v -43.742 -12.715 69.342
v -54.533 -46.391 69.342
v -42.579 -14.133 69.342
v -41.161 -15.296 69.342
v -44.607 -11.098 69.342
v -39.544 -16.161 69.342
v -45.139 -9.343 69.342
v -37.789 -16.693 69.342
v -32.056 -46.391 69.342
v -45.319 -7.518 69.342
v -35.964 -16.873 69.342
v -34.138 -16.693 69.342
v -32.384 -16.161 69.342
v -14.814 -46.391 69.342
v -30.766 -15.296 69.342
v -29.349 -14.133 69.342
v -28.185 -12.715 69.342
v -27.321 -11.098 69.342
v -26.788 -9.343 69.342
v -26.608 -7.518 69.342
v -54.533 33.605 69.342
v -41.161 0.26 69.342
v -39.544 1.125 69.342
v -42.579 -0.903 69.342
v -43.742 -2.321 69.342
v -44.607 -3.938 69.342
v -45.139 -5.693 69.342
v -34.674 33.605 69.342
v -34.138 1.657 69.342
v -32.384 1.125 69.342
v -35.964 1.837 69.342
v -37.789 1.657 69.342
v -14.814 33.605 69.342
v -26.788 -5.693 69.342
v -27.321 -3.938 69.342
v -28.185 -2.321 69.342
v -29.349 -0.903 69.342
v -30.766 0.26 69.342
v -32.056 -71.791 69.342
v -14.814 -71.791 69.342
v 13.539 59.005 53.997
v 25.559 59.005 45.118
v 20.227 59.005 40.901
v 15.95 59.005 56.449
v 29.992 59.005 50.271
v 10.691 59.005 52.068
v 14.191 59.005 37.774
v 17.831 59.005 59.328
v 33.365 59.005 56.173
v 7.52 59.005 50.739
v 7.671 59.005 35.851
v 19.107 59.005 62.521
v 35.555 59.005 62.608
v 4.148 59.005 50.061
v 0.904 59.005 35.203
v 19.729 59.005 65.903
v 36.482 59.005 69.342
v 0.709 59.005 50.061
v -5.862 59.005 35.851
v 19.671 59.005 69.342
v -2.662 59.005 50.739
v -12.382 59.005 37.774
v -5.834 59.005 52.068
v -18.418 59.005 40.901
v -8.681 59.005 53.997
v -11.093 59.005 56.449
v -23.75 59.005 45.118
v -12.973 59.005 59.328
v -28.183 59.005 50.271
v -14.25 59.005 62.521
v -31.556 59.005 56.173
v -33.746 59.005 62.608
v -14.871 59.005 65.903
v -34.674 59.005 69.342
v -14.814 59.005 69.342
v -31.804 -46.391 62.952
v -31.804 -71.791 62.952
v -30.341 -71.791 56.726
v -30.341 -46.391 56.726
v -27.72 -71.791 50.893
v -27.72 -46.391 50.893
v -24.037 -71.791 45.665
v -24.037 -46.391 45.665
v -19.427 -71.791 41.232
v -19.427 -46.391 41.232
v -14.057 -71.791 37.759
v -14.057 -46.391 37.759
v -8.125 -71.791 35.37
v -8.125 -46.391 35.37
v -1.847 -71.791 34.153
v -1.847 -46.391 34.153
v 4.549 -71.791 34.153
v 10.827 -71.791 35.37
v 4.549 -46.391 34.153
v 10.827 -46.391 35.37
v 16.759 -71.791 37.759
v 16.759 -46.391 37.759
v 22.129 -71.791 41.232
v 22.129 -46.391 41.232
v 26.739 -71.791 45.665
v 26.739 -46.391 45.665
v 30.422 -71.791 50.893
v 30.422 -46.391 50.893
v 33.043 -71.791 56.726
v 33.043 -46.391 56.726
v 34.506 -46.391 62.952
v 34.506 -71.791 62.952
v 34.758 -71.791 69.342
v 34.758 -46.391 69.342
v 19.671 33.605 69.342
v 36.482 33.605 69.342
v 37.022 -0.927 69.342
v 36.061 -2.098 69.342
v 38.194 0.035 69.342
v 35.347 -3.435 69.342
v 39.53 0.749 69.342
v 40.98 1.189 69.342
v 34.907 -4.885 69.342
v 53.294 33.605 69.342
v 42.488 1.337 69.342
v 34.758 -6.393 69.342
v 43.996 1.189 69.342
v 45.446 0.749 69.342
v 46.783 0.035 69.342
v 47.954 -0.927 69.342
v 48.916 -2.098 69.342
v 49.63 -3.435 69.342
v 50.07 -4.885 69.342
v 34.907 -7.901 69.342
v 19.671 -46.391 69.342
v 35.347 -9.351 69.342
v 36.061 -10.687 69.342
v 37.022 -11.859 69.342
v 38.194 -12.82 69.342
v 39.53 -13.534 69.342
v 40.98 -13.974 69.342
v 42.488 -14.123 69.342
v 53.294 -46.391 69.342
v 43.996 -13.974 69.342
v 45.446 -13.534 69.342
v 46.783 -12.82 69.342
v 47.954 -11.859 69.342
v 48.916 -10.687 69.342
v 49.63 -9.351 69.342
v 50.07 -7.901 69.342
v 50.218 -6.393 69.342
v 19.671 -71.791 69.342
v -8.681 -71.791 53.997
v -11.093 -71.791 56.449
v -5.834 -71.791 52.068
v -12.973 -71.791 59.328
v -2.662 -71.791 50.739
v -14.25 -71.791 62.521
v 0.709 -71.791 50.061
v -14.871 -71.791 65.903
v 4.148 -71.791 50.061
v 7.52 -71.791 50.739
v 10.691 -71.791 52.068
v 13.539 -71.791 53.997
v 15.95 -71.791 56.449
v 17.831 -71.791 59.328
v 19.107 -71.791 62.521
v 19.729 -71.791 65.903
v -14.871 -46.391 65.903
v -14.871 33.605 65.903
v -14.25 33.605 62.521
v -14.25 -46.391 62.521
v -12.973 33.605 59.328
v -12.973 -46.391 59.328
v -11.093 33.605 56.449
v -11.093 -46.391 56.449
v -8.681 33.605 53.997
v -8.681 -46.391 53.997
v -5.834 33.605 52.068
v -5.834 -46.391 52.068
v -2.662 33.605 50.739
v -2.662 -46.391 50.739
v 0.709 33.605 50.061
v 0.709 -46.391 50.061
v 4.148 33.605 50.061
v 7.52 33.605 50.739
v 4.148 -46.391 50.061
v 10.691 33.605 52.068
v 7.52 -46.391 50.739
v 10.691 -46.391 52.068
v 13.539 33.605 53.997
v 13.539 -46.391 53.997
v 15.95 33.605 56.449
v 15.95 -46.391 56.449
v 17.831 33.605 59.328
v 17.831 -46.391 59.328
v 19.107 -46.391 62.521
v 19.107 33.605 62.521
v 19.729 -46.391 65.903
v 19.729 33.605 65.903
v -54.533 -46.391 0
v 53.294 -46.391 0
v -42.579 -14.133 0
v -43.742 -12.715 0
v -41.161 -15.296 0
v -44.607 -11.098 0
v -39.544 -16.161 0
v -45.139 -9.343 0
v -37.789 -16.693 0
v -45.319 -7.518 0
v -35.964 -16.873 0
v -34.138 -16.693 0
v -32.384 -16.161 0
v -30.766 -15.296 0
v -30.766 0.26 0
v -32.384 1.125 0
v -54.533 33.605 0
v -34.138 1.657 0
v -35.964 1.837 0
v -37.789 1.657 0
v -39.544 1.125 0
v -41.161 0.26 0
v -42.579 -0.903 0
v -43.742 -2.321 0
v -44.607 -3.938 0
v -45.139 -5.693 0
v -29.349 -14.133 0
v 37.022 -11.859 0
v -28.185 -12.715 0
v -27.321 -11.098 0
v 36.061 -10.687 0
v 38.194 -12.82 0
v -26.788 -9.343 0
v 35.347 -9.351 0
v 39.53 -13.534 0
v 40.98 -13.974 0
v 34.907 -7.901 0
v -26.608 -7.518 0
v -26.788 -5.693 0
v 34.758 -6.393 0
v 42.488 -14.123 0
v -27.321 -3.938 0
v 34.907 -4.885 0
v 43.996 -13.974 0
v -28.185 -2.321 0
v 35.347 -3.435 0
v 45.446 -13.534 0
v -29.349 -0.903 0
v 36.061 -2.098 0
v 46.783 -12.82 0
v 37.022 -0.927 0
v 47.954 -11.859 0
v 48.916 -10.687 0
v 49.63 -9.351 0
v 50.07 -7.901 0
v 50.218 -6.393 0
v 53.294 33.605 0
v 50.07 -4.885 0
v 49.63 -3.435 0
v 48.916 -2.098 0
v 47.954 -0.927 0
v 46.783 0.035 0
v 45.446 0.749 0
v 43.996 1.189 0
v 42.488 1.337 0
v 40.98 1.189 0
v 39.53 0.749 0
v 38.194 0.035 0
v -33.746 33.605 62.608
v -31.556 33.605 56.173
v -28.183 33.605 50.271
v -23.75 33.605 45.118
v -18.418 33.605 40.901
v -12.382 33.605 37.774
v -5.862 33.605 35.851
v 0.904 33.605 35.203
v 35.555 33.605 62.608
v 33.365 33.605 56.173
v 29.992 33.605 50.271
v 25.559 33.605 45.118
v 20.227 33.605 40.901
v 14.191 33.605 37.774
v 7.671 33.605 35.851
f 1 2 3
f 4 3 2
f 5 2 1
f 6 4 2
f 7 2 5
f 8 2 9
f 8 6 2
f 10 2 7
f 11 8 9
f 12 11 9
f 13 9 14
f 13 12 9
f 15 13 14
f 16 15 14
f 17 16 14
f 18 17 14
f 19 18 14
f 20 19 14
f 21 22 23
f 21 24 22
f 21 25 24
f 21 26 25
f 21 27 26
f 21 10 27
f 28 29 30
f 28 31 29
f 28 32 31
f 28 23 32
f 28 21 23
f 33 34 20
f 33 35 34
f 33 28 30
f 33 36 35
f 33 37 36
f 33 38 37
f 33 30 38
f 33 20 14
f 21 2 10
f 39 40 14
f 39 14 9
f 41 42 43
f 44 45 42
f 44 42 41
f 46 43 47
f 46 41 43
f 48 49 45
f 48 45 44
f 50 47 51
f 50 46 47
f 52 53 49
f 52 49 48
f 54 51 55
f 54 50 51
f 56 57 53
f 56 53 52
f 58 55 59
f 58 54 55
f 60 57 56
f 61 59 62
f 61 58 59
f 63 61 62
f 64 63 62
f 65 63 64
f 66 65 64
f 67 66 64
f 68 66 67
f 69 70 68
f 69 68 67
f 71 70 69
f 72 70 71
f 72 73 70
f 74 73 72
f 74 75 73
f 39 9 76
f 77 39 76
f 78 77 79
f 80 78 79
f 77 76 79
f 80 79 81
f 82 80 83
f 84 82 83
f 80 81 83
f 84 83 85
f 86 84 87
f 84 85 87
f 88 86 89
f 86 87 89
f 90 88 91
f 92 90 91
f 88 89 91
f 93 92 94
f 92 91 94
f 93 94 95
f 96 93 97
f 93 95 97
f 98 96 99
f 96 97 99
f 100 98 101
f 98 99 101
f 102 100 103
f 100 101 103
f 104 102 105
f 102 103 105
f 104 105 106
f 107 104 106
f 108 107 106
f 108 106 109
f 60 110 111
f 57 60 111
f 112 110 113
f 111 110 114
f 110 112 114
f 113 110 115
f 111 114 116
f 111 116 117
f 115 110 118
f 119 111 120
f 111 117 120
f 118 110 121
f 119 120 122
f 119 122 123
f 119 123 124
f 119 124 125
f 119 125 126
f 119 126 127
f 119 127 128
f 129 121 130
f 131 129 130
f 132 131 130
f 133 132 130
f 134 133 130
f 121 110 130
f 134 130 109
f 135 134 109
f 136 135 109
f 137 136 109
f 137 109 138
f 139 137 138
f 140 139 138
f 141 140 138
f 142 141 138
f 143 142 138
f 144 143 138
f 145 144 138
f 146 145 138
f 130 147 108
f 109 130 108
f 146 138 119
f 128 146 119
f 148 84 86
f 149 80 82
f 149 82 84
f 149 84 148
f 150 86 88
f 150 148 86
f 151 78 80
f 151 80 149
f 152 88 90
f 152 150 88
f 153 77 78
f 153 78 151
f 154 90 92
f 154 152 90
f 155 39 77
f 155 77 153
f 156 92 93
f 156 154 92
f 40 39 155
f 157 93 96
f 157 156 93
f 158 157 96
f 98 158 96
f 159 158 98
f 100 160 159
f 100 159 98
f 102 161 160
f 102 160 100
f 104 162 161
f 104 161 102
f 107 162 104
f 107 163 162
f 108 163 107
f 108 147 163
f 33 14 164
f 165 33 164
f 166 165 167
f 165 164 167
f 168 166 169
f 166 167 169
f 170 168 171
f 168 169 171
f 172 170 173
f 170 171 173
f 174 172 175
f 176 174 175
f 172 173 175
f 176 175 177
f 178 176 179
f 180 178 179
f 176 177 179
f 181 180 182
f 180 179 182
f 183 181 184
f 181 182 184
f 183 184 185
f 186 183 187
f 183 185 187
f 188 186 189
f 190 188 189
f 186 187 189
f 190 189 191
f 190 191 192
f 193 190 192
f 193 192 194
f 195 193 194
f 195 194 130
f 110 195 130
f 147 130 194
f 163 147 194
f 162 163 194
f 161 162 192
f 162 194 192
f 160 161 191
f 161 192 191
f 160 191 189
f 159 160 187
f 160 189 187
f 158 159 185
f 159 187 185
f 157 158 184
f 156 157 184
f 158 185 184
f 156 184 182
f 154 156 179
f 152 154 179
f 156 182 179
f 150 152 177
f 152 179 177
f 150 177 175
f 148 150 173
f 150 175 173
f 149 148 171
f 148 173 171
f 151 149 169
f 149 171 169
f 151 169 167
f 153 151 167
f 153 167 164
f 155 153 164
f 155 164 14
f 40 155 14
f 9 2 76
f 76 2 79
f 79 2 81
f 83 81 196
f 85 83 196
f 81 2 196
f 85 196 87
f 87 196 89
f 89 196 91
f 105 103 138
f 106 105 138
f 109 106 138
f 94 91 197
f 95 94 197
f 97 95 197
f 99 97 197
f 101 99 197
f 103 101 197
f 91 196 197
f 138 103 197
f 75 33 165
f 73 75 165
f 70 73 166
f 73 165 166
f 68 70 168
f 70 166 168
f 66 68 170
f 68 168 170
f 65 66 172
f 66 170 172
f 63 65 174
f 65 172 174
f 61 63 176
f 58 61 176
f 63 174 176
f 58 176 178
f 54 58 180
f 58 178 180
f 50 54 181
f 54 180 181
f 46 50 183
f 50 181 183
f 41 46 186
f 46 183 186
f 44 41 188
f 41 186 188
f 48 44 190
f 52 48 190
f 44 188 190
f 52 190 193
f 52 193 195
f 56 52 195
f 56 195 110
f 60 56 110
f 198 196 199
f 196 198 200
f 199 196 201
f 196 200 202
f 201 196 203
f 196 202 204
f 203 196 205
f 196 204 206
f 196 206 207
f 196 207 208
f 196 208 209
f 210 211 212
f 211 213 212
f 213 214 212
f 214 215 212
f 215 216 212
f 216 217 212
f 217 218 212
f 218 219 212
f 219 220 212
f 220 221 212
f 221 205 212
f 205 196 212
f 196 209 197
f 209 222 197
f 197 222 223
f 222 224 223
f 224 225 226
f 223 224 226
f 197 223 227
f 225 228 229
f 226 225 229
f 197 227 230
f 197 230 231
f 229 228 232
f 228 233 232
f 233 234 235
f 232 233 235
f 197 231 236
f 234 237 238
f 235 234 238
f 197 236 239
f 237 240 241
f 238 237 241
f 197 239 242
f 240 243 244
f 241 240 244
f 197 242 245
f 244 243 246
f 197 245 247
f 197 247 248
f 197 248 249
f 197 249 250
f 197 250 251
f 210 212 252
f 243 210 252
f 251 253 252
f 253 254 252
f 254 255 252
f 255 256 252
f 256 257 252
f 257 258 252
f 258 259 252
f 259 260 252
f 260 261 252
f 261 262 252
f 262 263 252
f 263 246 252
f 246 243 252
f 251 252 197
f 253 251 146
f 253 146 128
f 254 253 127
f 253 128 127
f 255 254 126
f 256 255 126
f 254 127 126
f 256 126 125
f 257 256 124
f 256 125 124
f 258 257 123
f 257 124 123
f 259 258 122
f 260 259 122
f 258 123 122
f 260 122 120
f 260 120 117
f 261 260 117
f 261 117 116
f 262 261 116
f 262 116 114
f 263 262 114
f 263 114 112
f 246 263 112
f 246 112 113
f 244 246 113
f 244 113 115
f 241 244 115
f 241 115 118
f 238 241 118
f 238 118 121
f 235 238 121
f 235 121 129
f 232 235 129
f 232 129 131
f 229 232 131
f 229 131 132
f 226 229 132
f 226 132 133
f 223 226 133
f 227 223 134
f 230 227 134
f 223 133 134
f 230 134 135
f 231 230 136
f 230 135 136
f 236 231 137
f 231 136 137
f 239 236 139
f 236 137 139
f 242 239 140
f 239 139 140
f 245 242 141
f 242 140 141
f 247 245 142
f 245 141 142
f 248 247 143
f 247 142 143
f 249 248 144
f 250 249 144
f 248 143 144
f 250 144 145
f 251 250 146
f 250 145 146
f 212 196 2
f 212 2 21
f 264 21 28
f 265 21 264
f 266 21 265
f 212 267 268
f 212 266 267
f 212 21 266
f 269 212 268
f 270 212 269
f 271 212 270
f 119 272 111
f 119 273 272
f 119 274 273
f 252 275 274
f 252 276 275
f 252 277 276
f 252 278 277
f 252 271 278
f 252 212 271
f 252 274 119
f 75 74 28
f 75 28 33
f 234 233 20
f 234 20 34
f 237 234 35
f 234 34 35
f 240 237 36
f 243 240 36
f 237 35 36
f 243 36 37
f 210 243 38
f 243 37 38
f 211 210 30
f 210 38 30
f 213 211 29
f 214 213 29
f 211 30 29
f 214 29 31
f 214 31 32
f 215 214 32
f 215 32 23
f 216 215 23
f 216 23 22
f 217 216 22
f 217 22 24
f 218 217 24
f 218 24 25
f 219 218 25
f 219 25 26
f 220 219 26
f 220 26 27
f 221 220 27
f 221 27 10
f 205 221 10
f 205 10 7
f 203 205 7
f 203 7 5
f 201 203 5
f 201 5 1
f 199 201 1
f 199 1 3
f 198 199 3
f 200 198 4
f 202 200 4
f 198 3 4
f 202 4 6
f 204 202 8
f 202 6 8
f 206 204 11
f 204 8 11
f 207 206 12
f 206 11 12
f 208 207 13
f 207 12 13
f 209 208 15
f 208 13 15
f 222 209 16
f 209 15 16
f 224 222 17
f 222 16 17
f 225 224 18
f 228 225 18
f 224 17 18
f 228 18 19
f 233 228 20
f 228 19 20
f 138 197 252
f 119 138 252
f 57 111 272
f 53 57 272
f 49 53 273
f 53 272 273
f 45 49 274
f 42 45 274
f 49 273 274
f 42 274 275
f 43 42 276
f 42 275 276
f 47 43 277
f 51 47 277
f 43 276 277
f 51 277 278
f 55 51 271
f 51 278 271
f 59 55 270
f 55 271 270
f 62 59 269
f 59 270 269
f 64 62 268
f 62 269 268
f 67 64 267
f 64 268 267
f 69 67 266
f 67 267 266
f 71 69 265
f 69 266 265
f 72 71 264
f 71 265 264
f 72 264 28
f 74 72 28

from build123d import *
from build123d import SkipClean  # not in build123d's __all__

# Parameters (mm, degrees)
F0_W     = 107.8271307051
F0_H     = 79.9957364798
F1_DEPTH = 69.342
F3_DEPTH = 171.704
F4_DEPTH = 25.4
F6_DEPTH = 25.4
F7_R     = 9.3550857854
F8_DEPTH = 220.218
F7_R_2   = 7.7300183475
F9_DEPTH = 194.31


# Not quite as in the source:
# - after a boolean that leaves OpenCascade's solid faulty, fix() repairs it


with BuildPart() as f1:
    # F0 (on Top) → F1 (new body)
    with BuildSketch(Plane.XY):
        with Locations((-0.6197858602, -6.3926763833)):
            Rectangle(F0_W, F0_H)
    extrude(amount=F1_DEPTH)

    # F2 (on face) → F3 (cut)
    with BuildSketch(Plane.XZ.offset(46.3905446231)):
        with BuildLine():
            Line((19.6710973978, 69.342), (-14.813689515, 69.342))
            ThreePointArc((-14.813689515, 69.342), (2.4287039414, 49.9755106866), (19.6710973978, 69.342))
        make_face()
    extrude(amount=-F3_DEPTH, mode=Mode.SUBTRACT)

    # F2 (on face) → F4 (join)
    with BuildSketch(Plane.XZ.offset(46.3905446231)):
        with BuildLine():
            Line((-14.813689515, 69.342), (-32.0560820401, 69.342))
            ThreePointArc((-32.0560820401, 69.342), (1.3510622084, 33.9996767093), (34.7582064569, 69.342))
            Line((34.7582064569, 69.342), (19.6710973978, 69.342))
            ThreePointArc((19.6710973978, 69.342), (2.4287039414, 49.9755106866), (-14.813689515, 69.342))
        make_face()
    with SkipClean():  # cleaning this boolean's faces spoils the solid; the shape is the same uncleaned
        extrude(amount=F4_DEPTH)

    # F5 (on face) → F6 (join)
    with BuildSketch(Plane(origin=(0, 33.6051918566, 0), x_dir=(-1, 0, 0), z_dir=(0, 1, 0))):
        with BuildLine():
            Line((-19.6710973978, 69.342), (-36.4824384451, 69.342))
            ThreePointArc((-36.4824384451, 69.342), (-0.9044590406, 35.2025825454), (34.6735203639, 69.342))
            Line((34.6735203639, 69.342), (14.813689515, 69.342))
            ThreePointArc((14.813689515, 69.342), (-2.4287039414, 49.9755106866), (-19.6710973978, 69.342))
        make_face()
    extrude(amount=F6_DEPTH)

    add(f1.part.fix(), mode=Mode.REPLACE)

    # F7 (on face) → F8 (cut)
    with BuildSketch(Plane.XY.offset(69.342)):
        with Locations((-35.963576287, -7.5180209242)):
            Circle(F7_R)
    extrude(amount=-F8_DEPTH, mode=Mode.SUBTRACT)

    # F7 (on face) → F9 (cut)
    with BuildSketch(Plane.XY.offset(69.342)):
        with Locations((42.4882248044, -6.3926763833)):
            Circle(F7_R_2)
    extrude(amount=-F9_DEPTH, mode=Mode.SUBTRACT)


solid = f1.part
